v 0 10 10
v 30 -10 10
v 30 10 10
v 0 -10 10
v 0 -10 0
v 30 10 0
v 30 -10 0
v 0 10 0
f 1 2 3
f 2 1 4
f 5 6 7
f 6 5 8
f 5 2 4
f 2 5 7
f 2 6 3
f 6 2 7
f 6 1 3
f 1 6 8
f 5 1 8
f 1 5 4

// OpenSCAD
module center(axis, size)
{
  c = [ axis.x?1:0, axis.y?1:0, axis.z?1:0 ];
  translate([ c.x*-size.x/2, c.y*-size.y/2, c.z*-size.z/2 ])
    children();
}


module center_xy(size)
{
  center([1,1,0], size)
    children();
}


s = [30,20,10];
if(1)
  center([0,1,0], s)
    cube(s);
if(0)
  center_xy(s)
    cube(s);
